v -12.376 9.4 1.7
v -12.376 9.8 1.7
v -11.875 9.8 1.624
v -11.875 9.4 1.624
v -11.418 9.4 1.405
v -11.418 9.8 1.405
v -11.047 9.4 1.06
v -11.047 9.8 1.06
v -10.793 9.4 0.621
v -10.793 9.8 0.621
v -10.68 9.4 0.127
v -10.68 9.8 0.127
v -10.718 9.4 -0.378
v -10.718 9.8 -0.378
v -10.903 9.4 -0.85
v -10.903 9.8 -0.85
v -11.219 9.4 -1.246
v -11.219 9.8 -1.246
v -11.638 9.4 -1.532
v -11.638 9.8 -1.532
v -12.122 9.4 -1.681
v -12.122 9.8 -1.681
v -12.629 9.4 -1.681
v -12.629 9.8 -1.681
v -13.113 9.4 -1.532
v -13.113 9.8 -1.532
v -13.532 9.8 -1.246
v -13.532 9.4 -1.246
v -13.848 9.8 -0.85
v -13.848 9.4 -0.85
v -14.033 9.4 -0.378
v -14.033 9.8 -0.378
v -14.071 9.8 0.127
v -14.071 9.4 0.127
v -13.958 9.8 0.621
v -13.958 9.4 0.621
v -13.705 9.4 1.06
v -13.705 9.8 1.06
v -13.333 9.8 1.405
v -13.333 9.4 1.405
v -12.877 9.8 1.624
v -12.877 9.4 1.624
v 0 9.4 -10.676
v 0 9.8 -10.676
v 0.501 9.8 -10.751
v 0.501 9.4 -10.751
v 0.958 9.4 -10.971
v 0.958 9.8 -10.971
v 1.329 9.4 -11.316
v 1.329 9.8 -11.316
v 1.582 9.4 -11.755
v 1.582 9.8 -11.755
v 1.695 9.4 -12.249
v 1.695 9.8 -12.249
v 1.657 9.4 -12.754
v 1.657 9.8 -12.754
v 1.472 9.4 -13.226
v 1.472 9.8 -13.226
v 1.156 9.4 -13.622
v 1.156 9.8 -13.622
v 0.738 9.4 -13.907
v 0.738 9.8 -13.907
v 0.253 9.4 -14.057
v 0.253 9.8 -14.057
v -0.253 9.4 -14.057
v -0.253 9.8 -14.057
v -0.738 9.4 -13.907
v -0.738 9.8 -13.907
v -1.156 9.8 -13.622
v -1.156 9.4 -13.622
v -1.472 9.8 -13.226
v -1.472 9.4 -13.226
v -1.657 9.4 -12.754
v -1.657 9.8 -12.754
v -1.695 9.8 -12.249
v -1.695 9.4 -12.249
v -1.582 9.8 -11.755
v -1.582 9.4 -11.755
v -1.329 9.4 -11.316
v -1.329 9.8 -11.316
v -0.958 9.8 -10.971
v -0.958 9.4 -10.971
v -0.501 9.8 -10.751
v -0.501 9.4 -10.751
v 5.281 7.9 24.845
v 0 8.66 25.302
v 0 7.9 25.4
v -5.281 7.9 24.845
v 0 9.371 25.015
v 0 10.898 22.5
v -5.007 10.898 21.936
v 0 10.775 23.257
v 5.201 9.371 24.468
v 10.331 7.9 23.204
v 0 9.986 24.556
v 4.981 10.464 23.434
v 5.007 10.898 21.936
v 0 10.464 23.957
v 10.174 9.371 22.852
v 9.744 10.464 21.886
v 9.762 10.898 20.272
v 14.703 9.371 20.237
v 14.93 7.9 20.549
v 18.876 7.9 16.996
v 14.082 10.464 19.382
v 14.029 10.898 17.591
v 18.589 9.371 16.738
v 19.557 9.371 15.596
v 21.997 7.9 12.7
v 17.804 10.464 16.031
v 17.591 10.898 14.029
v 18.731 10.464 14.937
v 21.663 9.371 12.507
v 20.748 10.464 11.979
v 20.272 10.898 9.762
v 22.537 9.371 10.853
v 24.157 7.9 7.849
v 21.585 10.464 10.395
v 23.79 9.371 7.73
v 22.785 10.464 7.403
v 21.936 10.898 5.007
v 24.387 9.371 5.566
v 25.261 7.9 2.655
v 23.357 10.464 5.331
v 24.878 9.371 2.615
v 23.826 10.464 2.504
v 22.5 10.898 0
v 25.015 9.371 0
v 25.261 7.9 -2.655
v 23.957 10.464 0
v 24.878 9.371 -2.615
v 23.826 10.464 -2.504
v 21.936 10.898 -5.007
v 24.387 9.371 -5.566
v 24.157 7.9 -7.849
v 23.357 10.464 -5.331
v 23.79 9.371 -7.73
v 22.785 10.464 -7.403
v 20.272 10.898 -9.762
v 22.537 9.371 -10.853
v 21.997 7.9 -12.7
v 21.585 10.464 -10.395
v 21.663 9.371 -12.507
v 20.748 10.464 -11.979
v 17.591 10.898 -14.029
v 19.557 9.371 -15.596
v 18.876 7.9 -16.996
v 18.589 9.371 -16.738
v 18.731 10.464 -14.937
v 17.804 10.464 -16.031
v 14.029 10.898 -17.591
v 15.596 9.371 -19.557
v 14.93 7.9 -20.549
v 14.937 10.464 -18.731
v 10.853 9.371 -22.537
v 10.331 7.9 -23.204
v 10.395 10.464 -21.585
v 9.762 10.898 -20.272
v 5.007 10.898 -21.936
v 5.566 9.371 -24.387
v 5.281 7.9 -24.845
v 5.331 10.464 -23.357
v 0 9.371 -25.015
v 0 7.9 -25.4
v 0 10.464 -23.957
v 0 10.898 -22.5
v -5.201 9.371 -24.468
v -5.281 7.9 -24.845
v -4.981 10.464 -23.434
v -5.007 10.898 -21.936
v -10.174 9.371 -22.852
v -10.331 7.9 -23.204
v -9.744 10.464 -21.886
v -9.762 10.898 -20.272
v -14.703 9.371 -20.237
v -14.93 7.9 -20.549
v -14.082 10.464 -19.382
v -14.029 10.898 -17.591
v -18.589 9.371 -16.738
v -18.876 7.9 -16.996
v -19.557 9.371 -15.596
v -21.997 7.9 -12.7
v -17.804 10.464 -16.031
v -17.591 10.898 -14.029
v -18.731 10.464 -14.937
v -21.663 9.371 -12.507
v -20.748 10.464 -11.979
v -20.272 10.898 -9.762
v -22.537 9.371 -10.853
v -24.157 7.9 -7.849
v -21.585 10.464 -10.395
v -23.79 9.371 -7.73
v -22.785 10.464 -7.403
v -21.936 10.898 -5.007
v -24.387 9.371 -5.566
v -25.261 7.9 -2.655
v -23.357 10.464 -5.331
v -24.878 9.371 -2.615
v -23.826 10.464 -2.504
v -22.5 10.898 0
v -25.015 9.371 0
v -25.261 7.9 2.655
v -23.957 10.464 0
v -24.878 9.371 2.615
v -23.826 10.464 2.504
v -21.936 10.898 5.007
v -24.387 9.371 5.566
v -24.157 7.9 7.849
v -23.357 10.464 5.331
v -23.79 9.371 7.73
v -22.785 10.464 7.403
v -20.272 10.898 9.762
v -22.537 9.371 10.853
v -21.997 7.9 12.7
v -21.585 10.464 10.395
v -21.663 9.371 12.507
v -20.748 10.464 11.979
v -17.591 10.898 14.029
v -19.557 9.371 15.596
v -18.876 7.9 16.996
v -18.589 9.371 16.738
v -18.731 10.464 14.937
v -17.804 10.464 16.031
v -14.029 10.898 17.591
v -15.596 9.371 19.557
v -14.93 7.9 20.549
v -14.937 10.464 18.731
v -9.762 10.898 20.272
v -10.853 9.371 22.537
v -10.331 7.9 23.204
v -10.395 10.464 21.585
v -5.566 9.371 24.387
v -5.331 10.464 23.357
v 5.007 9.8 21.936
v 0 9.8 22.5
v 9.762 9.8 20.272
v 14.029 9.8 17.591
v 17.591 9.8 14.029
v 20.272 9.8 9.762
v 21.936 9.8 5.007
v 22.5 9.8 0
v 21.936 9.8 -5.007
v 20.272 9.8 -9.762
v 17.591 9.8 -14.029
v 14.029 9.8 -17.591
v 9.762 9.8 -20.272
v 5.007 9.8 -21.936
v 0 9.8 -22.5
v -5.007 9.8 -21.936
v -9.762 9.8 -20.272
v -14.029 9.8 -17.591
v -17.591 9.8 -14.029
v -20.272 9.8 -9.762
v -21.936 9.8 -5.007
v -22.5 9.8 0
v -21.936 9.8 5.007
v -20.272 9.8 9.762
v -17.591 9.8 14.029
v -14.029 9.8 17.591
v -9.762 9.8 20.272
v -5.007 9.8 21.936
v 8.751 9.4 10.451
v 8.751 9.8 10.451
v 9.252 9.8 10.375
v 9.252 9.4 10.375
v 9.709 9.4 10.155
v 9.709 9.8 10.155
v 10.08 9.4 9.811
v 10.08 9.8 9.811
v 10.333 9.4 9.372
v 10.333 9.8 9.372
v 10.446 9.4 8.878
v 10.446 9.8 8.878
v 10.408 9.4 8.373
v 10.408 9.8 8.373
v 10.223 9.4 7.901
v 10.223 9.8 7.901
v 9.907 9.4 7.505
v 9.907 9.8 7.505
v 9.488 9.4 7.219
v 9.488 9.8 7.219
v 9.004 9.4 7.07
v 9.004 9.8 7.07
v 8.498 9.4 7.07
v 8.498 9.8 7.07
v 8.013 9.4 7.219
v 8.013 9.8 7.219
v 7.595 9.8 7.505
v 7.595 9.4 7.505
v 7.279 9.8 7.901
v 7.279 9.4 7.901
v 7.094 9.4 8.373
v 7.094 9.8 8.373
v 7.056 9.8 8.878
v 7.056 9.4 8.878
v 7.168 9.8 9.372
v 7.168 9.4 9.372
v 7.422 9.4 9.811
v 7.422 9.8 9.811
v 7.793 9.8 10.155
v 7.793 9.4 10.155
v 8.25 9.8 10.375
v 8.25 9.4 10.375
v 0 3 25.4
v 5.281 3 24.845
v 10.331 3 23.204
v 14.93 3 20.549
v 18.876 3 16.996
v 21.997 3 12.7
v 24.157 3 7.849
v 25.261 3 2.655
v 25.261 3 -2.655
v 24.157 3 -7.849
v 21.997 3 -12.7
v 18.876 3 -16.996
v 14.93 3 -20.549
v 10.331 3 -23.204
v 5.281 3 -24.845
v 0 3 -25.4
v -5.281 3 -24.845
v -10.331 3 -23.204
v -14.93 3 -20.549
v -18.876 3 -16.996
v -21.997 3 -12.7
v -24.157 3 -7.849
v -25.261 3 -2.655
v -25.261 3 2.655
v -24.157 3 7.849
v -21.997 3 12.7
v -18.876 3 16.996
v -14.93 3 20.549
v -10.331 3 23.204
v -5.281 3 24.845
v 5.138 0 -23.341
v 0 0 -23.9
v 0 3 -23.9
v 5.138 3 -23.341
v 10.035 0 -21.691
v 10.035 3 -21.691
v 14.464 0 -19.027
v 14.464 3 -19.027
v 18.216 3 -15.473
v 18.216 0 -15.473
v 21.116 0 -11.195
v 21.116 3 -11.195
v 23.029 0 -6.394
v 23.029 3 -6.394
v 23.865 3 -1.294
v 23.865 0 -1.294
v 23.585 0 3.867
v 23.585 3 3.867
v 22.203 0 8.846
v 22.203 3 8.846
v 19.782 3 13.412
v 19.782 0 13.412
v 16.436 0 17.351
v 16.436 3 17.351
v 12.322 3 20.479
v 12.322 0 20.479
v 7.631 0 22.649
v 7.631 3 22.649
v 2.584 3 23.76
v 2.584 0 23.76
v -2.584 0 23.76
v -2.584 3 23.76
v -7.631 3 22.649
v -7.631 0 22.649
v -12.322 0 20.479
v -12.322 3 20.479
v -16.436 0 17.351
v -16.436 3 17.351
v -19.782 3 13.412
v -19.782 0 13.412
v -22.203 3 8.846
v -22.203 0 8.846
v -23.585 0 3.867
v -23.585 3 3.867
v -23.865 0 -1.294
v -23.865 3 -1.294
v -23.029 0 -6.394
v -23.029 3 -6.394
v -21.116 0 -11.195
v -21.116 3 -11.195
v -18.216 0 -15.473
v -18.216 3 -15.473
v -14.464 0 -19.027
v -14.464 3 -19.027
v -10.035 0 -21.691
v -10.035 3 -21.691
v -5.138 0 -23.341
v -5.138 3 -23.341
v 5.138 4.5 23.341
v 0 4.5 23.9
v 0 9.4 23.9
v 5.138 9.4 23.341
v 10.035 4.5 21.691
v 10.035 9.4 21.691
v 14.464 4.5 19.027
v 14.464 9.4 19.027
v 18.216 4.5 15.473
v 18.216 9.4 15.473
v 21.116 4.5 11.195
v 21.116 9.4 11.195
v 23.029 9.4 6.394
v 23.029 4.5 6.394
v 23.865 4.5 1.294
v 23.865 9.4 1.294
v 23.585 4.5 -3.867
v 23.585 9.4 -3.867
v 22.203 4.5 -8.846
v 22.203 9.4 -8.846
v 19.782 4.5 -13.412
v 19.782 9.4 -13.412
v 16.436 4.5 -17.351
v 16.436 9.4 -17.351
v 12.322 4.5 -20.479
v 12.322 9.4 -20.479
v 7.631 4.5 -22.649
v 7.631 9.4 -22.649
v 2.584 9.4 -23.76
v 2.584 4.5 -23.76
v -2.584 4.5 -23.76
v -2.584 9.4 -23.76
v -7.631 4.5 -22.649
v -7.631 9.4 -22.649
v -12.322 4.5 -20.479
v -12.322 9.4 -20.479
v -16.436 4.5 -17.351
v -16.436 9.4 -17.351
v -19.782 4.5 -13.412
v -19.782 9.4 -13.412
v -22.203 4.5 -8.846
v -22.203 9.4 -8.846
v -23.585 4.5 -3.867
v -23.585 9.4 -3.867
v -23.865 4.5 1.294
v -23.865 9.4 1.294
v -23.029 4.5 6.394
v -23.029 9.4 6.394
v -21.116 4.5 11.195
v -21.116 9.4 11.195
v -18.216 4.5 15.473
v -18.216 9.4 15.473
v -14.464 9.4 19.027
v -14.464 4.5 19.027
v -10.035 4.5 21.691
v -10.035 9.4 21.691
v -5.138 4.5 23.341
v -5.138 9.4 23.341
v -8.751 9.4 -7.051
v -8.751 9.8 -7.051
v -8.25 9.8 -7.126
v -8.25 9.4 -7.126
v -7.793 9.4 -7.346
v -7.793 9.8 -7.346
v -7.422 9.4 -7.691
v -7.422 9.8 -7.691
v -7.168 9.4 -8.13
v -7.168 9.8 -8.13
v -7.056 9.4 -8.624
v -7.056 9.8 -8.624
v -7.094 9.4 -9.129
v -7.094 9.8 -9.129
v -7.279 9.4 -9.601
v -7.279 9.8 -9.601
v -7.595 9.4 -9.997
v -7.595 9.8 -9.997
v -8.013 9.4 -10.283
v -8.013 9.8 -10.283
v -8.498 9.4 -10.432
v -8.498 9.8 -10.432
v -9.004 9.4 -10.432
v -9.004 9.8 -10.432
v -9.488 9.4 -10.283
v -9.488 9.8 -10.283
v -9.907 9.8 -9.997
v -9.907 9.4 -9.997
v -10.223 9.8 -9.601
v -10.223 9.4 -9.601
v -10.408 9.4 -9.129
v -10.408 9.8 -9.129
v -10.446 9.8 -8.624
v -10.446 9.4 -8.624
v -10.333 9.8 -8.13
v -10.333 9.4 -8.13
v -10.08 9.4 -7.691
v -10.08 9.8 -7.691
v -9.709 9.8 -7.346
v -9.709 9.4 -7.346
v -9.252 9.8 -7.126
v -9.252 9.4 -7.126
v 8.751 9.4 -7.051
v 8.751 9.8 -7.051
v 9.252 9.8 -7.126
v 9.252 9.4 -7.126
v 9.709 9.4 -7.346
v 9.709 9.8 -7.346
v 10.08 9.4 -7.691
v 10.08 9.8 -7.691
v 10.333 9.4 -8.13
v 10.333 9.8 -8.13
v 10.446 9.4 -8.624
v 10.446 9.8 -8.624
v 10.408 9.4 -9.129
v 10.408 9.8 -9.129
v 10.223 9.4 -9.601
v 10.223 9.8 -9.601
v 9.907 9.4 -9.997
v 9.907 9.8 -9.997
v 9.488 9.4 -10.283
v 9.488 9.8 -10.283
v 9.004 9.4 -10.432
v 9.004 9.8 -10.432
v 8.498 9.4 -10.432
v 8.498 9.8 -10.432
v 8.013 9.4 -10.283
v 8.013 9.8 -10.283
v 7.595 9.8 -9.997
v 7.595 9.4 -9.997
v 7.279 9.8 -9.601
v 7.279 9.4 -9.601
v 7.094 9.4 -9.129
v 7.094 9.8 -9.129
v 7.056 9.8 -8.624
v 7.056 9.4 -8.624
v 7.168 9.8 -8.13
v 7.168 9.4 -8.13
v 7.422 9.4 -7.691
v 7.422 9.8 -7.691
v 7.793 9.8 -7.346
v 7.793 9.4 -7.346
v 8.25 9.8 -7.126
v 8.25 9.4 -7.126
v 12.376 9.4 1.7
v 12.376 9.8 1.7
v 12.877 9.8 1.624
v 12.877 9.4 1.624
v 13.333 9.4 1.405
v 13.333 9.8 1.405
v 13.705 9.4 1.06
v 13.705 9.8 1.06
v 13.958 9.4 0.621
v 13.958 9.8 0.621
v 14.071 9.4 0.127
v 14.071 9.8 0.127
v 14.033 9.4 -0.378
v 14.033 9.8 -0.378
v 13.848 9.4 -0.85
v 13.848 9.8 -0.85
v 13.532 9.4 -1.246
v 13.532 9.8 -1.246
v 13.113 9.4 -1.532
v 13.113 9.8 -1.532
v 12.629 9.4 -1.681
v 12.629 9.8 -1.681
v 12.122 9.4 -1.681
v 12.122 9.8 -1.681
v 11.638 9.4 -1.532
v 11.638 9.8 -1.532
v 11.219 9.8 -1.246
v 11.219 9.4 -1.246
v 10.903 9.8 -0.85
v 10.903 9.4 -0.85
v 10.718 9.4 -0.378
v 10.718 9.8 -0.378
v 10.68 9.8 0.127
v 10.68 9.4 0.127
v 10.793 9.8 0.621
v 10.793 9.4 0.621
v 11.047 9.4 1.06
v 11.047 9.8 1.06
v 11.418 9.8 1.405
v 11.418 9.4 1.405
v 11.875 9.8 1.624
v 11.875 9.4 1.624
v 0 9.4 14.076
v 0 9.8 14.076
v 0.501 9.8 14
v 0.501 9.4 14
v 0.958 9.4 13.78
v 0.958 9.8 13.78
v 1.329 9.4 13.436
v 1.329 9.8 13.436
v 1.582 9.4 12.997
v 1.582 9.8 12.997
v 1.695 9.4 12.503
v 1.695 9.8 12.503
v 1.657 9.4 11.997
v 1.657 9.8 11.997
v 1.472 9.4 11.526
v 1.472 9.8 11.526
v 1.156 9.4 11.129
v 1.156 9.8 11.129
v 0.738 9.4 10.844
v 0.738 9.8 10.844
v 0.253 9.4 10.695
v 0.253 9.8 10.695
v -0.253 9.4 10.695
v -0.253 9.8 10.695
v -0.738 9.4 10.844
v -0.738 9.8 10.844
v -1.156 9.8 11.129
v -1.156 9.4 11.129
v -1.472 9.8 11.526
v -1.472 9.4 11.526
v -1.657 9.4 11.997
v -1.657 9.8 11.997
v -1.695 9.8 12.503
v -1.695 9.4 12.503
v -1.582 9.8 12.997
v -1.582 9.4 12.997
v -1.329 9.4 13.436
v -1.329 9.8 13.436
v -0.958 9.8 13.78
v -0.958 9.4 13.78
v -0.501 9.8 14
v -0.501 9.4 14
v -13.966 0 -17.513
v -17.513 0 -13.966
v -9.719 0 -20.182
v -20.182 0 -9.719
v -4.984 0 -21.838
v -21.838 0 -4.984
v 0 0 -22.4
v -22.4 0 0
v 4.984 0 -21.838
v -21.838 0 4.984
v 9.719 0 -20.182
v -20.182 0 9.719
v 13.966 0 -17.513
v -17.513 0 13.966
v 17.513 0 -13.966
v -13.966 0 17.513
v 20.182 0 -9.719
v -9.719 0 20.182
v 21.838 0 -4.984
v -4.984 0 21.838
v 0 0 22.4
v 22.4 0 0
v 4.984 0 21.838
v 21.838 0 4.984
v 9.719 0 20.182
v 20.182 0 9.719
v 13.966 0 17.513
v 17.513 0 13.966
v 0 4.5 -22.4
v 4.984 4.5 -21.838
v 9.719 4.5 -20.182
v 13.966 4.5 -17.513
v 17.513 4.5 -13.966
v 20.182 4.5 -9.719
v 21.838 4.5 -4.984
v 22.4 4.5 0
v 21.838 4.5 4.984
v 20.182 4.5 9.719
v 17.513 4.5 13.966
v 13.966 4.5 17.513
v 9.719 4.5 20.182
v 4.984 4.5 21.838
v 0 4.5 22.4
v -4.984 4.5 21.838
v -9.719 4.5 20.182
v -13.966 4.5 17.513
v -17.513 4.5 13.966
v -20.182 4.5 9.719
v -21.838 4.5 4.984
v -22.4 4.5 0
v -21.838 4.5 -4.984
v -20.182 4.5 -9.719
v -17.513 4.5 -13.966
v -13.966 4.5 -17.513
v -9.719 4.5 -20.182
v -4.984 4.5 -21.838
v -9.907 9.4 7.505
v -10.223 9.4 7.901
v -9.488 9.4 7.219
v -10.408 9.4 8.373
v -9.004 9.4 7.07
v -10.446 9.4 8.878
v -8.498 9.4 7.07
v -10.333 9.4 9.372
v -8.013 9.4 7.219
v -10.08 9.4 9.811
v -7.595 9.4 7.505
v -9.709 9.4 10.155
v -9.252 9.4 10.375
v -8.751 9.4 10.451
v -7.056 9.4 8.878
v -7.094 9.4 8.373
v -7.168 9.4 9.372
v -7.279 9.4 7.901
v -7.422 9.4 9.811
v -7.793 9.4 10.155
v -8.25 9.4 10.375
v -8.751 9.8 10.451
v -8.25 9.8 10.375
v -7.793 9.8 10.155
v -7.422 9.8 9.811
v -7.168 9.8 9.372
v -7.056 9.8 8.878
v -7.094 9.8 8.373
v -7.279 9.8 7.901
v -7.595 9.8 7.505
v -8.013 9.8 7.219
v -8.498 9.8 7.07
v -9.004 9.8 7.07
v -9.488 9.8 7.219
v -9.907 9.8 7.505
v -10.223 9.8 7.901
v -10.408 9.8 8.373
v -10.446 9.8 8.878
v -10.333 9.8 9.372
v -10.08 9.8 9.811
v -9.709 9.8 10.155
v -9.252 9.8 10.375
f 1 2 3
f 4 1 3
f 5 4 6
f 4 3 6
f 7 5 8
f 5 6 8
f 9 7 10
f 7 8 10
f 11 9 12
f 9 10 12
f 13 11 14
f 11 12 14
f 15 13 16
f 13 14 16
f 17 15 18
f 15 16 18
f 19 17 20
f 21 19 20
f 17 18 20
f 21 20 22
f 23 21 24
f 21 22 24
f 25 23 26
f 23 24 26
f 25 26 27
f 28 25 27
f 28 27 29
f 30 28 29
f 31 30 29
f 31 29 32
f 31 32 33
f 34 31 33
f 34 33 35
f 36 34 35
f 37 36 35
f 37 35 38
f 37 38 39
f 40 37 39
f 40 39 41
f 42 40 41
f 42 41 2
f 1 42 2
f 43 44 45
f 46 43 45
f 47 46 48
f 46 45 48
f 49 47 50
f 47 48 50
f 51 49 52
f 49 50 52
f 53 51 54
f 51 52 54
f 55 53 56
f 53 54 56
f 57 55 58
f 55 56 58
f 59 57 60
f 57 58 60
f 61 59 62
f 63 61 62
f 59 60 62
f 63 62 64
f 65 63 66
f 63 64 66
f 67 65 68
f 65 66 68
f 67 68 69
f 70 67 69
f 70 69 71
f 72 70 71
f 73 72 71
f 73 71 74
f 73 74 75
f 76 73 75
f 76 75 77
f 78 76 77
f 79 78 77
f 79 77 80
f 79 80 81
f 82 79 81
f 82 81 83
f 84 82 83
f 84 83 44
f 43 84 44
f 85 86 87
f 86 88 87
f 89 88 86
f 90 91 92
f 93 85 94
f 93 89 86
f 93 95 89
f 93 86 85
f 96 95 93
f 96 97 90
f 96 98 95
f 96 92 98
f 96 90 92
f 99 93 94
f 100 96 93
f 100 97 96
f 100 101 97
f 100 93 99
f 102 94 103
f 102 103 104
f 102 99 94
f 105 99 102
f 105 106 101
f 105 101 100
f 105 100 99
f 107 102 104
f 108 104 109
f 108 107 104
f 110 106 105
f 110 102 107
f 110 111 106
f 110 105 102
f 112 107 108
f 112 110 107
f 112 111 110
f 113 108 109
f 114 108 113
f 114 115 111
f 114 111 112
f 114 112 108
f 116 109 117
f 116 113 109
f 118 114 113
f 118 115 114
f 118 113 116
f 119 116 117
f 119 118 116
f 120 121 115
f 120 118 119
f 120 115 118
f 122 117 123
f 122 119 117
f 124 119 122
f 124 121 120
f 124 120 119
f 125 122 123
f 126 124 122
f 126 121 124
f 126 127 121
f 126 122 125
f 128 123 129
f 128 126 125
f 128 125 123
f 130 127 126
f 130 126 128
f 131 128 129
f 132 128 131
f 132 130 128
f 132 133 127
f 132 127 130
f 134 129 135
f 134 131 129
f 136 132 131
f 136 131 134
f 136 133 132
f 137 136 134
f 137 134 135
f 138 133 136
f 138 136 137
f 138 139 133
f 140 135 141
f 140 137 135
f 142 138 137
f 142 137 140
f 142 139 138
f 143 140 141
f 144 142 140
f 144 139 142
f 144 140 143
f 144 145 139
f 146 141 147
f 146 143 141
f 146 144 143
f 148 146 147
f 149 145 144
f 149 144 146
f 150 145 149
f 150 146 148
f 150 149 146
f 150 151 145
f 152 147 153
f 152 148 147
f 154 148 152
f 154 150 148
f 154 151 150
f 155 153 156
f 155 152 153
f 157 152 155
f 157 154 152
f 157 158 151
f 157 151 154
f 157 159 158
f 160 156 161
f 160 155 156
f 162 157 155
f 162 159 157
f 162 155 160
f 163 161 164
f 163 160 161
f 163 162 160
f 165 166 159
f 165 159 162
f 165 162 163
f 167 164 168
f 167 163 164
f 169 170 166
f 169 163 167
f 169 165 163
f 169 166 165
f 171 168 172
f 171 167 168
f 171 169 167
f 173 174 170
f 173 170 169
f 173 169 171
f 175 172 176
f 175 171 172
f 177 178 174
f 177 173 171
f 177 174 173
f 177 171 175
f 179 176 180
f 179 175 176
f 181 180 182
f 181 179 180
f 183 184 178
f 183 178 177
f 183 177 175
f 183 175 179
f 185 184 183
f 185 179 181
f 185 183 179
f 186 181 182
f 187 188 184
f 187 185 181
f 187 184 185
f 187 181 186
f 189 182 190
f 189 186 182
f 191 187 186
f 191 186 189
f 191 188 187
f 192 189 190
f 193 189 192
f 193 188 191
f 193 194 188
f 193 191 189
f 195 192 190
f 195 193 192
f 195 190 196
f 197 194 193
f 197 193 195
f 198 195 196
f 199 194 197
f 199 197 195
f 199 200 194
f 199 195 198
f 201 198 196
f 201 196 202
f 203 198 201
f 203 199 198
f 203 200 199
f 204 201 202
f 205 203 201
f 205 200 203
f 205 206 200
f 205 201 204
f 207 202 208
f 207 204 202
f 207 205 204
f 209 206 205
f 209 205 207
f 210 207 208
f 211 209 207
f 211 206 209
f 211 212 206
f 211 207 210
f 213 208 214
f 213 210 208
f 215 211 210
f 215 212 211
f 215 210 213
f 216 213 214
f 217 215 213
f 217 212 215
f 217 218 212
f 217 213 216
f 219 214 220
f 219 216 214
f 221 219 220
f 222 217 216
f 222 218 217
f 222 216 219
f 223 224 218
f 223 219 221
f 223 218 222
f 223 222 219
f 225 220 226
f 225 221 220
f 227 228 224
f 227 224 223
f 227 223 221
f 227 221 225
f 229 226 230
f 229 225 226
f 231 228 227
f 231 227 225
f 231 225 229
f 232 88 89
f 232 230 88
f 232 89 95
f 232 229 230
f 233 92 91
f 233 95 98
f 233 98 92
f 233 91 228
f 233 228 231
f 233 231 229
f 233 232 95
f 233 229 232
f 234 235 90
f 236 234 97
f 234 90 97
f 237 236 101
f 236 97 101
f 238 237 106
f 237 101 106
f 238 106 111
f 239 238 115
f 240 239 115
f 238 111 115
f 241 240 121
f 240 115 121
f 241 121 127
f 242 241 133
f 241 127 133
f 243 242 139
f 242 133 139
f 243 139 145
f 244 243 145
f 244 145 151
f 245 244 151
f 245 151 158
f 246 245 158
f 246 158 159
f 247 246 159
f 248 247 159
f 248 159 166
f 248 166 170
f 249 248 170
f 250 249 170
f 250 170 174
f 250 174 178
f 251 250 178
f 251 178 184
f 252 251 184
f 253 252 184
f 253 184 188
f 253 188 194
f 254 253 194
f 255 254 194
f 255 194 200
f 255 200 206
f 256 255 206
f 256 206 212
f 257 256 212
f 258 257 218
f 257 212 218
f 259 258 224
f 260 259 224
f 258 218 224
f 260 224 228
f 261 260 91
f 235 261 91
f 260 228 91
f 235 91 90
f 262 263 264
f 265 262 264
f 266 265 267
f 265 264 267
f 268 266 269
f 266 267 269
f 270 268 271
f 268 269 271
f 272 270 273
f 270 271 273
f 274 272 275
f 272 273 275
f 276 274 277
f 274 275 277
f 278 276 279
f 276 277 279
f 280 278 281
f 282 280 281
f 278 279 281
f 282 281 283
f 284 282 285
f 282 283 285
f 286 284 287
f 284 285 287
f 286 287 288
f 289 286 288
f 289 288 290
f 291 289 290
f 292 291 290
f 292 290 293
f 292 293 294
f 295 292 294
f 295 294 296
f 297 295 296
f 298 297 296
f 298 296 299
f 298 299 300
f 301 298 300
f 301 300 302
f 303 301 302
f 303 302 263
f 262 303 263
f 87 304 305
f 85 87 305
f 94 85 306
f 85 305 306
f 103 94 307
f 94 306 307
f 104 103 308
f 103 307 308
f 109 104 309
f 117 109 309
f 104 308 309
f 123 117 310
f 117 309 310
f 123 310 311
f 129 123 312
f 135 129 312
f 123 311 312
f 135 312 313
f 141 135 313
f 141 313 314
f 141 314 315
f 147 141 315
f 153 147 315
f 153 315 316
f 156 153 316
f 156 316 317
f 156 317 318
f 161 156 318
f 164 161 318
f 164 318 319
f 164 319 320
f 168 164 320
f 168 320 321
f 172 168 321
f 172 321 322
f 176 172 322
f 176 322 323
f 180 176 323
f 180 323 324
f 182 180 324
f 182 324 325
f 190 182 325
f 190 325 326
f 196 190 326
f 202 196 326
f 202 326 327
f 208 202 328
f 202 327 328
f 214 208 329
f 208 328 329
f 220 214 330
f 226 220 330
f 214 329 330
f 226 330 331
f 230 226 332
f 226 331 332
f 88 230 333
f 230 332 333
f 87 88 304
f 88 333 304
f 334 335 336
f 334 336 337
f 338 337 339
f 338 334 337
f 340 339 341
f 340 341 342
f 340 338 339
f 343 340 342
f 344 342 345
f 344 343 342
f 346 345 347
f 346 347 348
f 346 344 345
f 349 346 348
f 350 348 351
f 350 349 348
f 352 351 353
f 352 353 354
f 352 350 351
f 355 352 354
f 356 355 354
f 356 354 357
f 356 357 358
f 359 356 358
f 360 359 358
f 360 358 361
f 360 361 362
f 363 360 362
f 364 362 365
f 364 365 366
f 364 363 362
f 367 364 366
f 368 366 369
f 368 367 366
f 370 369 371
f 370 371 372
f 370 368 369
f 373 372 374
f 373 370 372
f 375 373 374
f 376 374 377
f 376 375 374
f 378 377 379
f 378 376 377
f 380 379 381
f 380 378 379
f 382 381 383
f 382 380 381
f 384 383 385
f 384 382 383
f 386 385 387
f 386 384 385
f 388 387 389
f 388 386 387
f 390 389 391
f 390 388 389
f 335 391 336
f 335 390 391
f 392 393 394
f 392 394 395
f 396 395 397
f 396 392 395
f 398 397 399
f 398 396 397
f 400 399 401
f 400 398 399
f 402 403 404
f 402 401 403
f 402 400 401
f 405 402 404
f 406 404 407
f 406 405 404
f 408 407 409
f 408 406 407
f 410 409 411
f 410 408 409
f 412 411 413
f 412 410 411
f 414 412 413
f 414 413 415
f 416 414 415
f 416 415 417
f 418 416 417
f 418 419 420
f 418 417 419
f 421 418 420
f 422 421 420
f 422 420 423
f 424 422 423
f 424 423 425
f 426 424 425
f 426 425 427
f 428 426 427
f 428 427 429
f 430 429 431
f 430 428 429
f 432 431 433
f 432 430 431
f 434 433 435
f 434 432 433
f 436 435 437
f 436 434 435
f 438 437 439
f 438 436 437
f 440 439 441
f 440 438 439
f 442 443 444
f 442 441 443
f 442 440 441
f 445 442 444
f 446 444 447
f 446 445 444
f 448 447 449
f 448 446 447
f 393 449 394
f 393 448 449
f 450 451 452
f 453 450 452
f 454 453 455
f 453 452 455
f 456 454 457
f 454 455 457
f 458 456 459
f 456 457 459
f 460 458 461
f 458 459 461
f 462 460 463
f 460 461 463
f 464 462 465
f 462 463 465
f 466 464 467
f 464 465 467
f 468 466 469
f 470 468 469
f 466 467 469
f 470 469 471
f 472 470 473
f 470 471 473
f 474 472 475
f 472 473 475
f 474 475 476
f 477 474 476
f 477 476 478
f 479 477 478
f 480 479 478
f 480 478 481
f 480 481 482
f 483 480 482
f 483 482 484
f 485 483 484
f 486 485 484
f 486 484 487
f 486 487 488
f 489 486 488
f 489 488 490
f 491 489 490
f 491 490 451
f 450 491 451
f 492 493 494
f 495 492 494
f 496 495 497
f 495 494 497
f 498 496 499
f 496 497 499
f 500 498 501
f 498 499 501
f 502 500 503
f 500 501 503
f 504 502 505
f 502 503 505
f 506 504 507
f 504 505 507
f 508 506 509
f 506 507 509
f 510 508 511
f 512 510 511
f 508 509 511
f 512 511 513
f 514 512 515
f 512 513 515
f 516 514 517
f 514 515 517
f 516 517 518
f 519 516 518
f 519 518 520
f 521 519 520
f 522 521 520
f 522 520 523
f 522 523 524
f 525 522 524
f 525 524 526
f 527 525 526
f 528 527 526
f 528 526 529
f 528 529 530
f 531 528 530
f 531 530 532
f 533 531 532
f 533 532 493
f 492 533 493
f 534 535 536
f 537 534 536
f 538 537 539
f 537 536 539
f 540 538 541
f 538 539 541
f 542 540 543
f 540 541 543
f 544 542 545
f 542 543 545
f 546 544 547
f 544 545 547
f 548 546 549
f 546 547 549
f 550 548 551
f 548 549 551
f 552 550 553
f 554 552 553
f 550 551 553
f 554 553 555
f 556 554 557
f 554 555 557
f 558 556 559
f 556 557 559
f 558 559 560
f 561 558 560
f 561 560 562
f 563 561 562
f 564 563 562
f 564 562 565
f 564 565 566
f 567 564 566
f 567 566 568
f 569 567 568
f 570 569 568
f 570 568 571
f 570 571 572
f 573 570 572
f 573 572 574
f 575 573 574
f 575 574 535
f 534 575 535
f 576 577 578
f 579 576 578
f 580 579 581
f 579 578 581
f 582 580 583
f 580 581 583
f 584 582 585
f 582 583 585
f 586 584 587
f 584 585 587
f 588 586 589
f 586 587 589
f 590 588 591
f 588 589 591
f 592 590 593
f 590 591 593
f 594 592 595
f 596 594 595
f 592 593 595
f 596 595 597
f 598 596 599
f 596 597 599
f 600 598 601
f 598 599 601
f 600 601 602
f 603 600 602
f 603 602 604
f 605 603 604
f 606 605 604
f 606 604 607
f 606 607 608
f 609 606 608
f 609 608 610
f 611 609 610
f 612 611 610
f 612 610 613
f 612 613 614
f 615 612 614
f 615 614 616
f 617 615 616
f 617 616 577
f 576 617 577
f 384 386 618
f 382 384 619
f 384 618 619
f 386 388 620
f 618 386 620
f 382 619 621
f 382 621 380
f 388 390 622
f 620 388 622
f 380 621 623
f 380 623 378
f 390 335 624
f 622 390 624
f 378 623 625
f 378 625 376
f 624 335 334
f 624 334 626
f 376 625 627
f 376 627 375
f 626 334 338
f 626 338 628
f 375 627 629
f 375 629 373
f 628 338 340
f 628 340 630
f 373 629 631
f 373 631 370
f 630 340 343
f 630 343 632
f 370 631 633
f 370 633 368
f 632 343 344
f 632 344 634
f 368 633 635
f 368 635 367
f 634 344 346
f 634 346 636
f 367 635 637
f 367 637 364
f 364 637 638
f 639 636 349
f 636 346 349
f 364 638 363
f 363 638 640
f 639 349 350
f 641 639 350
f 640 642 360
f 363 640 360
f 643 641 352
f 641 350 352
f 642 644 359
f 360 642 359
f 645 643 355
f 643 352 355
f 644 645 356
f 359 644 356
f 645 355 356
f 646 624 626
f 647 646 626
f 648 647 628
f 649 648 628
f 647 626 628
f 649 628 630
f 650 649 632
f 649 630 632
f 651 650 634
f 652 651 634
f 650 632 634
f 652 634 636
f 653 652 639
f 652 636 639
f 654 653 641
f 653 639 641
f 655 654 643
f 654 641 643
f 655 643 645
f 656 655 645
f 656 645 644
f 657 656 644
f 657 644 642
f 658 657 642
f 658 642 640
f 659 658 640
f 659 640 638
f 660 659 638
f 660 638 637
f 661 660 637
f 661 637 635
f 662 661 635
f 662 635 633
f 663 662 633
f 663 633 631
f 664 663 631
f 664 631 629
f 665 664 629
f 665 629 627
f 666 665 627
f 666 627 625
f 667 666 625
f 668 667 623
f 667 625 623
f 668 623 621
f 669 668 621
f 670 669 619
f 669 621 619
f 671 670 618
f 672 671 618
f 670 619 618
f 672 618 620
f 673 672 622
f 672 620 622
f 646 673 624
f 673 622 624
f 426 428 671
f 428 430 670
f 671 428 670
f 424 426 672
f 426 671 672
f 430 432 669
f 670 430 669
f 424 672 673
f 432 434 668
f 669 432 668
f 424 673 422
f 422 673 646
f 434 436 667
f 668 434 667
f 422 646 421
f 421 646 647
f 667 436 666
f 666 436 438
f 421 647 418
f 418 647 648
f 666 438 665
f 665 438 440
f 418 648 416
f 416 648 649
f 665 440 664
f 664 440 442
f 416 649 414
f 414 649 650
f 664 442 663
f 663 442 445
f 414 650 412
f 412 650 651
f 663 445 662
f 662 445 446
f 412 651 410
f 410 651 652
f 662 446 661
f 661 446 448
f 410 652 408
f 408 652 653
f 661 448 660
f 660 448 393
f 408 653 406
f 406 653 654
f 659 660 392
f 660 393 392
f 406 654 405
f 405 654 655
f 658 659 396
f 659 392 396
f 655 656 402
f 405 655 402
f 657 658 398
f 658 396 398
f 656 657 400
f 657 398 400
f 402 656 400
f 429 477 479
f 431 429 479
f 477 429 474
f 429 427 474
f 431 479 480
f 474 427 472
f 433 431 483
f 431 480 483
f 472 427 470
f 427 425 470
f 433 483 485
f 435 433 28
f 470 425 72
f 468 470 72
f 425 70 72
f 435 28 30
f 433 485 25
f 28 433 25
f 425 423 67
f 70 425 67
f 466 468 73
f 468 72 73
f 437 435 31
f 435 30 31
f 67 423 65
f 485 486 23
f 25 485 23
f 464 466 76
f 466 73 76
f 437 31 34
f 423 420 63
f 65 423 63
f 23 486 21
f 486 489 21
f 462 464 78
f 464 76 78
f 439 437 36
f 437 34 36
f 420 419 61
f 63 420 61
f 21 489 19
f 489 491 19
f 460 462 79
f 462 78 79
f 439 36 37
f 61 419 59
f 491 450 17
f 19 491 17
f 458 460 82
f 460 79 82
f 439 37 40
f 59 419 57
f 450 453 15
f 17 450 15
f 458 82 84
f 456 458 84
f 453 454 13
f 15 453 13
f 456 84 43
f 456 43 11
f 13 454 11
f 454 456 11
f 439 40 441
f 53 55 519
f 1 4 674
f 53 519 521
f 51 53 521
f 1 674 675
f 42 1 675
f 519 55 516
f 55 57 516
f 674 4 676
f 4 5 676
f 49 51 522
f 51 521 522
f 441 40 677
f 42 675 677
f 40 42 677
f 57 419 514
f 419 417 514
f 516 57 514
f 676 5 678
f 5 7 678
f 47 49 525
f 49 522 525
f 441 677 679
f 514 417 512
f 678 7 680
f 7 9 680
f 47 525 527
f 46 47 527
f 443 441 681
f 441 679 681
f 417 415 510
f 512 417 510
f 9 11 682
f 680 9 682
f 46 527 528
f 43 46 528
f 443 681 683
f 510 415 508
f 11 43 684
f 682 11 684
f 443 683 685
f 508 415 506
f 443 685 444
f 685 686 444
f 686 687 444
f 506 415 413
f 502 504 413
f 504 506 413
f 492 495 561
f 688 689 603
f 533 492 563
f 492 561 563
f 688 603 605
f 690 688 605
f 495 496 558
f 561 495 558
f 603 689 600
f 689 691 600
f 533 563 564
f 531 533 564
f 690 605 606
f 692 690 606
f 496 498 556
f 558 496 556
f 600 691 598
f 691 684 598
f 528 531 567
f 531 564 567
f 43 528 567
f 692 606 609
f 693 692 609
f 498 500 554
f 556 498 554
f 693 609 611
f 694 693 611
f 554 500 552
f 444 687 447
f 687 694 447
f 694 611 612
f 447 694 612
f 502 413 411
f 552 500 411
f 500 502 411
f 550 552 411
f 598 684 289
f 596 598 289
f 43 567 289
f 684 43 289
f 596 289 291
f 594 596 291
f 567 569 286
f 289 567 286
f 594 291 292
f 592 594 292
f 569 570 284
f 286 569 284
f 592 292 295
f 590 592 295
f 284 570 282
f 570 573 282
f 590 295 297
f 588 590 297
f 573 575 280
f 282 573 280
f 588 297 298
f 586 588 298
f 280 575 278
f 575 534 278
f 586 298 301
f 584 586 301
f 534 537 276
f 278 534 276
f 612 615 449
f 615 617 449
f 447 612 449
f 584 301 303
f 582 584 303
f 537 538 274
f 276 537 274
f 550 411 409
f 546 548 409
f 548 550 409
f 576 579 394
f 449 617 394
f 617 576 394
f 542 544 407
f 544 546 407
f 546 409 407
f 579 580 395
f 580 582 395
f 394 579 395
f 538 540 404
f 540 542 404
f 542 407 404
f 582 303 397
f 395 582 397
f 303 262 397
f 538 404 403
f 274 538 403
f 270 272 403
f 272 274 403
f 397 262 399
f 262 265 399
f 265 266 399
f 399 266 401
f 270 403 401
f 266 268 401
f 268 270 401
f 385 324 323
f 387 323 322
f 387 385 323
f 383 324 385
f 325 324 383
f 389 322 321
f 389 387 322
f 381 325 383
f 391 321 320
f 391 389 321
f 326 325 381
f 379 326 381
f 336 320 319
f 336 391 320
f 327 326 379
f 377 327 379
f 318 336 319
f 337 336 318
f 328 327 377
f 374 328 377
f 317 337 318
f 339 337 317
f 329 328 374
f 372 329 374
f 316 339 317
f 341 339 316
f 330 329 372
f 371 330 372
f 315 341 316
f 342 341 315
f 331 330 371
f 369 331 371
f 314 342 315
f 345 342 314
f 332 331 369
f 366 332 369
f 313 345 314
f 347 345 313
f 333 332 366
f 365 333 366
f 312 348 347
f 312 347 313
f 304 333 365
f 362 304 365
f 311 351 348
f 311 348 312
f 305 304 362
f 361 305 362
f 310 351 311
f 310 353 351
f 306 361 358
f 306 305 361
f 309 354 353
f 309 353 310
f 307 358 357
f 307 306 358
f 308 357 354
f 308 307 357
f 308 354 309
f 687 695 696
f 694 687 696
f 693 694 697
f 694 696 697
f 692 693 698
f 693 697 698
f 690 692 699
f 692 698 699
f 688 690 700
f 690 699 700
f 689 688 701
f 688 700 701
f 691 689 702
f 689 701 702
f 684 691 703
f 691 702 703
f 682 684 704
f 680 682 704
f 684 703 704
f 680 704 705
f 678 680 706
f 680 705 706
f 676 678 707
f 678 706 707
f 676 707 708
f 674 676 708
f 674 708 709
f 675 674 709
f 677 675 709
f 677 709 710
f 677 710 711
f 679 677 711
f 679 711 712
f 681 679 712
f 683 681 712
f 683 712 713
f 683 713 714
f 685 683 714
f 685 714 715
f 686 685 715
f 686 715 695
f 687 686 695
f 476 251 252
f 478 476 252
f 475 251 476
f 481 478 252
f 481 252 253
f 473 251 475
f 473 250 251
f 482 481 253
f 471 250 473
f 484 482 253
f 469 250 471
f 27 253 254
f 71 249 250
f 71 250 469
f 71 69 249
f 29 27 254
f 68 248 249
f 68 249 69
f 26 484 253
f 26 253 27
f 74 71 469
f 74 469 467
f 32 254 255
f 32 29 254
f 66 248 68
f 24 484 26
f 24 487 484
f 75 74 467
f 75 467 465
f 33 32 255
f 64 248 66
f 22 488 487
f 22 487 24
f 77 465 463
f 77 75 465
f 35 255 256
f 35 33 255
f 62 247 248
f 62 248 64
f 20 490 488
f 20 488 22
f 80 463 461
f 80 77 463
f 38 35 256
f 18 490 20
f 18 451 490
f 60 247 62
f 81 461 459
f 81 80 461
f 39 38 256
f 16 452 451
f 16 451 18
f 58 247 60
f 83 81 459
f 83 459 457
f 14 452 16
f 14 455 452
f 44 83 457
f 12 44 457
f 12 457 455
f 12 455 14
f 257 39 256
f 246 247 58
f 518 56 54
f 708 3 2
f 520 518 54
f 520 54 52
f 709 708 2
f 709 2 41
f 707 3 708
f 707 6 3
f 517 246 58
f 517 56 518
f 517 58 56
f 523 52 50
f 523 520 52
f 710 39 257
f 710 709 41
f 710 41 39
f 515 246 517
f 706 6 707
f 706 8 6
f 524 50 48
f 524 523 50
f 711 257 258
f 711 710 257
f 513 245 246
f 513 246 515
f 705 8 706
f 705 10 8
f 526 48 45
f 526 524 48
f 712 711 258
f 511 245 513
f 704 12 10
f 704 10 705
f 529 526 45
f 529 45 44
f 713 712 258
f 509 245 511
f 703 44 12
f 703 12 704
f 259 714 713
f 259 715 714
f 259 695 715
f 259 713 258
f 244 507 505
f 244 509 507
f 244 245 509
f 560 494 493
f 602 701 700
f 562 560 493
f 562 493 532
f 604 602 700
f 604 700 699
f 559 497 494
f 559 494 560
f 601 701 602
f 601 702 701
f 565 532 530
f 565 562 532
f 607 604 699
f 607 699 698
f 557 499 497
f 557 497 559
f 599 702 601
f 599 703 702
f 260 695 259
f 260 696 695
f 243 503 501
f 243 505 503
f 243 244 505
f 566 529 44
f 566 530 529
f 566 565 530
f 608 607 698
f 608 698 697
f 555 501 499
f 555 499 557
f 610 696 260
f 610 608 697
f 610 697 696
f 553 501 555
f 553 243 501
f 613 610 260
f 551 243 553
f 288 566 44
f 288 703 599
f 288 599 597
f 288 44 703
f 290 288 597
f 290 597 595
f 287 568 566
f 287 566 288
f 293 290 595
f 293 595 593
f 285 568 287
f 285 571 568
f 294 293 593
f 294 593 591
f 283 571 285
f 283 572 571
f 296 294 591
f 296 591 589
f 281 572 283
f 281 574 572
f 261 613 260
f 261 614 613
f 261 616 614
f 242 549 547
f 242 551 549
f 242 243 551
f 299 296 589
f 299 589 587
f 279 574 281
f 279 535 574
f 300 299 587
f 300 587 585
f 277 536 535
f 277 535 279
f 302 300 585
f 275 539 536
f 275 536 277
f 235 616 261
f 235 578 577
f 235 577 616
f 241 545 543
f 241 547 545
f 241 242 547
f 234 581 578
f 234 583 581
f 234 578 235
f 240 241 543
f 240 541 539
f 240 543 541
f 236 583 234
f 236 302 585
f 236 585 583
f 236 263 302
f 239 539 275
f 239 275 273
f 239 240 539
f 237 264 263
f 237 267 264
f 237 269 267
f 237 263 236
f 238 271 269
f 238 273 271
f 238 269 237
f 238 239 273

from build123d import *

# Parameters (mm, degrees)
SKETCH1_R           = 25.4
BOSS_EXTRUDE1_DEPTH = 10.9
SKETCH4_OUTSIDE_W   = 67.332
SKETCH4_OUTSIDE_H   = 67.332
SKETCH4_OUTSIDE_R   = 23.9
CUT_EXTRUDE3_DEPTH  = 3
SHELL2_T            = -1.5
SKETCH2_R           = 1.7
CUT_EXTRUDE1_DEPTH  = 38.538380359
FILLET1_R           = 3
SKETCH3_R           = 22.5
CUT_EXTRUDE2_DEPTH  = 1.1


with BuildPart() as part:
    # Sketch1 → Boss-Extrude1 (new body)
    with BuildSketch(Plane(origin=(0, 0, 0), x_dir=(1, 0, 0), z_dir=(0, 1, 0))):
        with Locations(Location((0, 0, 0), (0, 0, 270))):
            Circle(SKETCH1_R)
    extrude(amount=BOSS_EXTRUDE1_DEPTH)

    # Sketch4 outside → Cut-Extrude3 (cut)
    with BuildSketch(Plane.XZ):
        Rectangle(SKETCH4_OUTSIDE_W, SKETCH4_OUTSIDE_H)
        with Locations(Location((0, 0, 0), (0, 0, 270))):
            Circle(SKETCH4_OUTSIDE_R, mode=Mode.SUBTRACT)
    extrude(amount=-CUT_EXTRUDE3_DEPTH, mode=Mode.SUBTRACT)

    # Shell2
    shell2_openings = [part.faces().sort_by_distance(p)[0] for p in [
        (0, 0, 0),
    ]]
    offset(amount=SHELL2_T, openings=shell2_openings, kind=Kind.INTERSECTION)

    # Sketch2 → Cut-Extrude1 (cut, through all)
    with BuildSketch(Plane(origin=(0, 10.9, 0), x_dir=(1, 0, 0), z_dir=(0, 1, 0))):
        with Locations(Location((0, 12.375623311, 0), (0, 0, 270))):
            Circle(SKETCH2_R)
        with Locations(Location((8.750887165, 8.750887165, 0), (0, 0, 270))):
            Circle(SKETCH2_R)
        with Locations(Location((12.375623311, 0, 0), (0, 0, 270))):
            Circle(SKETCH2_R)
        with Locations(Location((8.750887165, -8.750887165, 0), (0, 0, 270))):
            Circle(SKETCH2_R)
        with Locations(Location((0, -12.375623311, 0), (0, 0, 270))):
            Circle(SKETCH2_R)
        with Locations(Location((-8.750887165, -8.750887165, 0), (0, 0, 270))):
            Circle(SKETCH2_R)
        with Locations(Location((-12.375623311, 0, 0), (0, 0, 270))):
            Circle(SKETCH2_R)
        with Locations(Location((-8.750887165, 8.750887165, 0), (0, 0, 270))):
            Circle(SKETCH2_R)
    extrude(amount=-CUT_EXTRUDE1_DEPTH, mode=Mode.SUBTRACT)

    # Fillet1
    fillet1_edges = [part.edges().sort_by_distance(p)[0] for p in [
        (0, 10.9, -25.4),
    ]]
    fillet(fillet1_edges, radius=FILLET1_R)

    # Sketch3 → Cut-Extrude2 (cut)
    with BuildSketch(Plane(origin=(0, 10.9, 0), x_dir=(1, 0, 0), z_dir=(0, 1, 0))):
        with Locations(Location((0, 0, 0), (0, 0, 270))):
            Circle(SKETCH3_R)
    extrude(amount=-CUT_EXTRUDE2_DEPTH, mode=Mode.SUBTRACT)


solid = part.part
